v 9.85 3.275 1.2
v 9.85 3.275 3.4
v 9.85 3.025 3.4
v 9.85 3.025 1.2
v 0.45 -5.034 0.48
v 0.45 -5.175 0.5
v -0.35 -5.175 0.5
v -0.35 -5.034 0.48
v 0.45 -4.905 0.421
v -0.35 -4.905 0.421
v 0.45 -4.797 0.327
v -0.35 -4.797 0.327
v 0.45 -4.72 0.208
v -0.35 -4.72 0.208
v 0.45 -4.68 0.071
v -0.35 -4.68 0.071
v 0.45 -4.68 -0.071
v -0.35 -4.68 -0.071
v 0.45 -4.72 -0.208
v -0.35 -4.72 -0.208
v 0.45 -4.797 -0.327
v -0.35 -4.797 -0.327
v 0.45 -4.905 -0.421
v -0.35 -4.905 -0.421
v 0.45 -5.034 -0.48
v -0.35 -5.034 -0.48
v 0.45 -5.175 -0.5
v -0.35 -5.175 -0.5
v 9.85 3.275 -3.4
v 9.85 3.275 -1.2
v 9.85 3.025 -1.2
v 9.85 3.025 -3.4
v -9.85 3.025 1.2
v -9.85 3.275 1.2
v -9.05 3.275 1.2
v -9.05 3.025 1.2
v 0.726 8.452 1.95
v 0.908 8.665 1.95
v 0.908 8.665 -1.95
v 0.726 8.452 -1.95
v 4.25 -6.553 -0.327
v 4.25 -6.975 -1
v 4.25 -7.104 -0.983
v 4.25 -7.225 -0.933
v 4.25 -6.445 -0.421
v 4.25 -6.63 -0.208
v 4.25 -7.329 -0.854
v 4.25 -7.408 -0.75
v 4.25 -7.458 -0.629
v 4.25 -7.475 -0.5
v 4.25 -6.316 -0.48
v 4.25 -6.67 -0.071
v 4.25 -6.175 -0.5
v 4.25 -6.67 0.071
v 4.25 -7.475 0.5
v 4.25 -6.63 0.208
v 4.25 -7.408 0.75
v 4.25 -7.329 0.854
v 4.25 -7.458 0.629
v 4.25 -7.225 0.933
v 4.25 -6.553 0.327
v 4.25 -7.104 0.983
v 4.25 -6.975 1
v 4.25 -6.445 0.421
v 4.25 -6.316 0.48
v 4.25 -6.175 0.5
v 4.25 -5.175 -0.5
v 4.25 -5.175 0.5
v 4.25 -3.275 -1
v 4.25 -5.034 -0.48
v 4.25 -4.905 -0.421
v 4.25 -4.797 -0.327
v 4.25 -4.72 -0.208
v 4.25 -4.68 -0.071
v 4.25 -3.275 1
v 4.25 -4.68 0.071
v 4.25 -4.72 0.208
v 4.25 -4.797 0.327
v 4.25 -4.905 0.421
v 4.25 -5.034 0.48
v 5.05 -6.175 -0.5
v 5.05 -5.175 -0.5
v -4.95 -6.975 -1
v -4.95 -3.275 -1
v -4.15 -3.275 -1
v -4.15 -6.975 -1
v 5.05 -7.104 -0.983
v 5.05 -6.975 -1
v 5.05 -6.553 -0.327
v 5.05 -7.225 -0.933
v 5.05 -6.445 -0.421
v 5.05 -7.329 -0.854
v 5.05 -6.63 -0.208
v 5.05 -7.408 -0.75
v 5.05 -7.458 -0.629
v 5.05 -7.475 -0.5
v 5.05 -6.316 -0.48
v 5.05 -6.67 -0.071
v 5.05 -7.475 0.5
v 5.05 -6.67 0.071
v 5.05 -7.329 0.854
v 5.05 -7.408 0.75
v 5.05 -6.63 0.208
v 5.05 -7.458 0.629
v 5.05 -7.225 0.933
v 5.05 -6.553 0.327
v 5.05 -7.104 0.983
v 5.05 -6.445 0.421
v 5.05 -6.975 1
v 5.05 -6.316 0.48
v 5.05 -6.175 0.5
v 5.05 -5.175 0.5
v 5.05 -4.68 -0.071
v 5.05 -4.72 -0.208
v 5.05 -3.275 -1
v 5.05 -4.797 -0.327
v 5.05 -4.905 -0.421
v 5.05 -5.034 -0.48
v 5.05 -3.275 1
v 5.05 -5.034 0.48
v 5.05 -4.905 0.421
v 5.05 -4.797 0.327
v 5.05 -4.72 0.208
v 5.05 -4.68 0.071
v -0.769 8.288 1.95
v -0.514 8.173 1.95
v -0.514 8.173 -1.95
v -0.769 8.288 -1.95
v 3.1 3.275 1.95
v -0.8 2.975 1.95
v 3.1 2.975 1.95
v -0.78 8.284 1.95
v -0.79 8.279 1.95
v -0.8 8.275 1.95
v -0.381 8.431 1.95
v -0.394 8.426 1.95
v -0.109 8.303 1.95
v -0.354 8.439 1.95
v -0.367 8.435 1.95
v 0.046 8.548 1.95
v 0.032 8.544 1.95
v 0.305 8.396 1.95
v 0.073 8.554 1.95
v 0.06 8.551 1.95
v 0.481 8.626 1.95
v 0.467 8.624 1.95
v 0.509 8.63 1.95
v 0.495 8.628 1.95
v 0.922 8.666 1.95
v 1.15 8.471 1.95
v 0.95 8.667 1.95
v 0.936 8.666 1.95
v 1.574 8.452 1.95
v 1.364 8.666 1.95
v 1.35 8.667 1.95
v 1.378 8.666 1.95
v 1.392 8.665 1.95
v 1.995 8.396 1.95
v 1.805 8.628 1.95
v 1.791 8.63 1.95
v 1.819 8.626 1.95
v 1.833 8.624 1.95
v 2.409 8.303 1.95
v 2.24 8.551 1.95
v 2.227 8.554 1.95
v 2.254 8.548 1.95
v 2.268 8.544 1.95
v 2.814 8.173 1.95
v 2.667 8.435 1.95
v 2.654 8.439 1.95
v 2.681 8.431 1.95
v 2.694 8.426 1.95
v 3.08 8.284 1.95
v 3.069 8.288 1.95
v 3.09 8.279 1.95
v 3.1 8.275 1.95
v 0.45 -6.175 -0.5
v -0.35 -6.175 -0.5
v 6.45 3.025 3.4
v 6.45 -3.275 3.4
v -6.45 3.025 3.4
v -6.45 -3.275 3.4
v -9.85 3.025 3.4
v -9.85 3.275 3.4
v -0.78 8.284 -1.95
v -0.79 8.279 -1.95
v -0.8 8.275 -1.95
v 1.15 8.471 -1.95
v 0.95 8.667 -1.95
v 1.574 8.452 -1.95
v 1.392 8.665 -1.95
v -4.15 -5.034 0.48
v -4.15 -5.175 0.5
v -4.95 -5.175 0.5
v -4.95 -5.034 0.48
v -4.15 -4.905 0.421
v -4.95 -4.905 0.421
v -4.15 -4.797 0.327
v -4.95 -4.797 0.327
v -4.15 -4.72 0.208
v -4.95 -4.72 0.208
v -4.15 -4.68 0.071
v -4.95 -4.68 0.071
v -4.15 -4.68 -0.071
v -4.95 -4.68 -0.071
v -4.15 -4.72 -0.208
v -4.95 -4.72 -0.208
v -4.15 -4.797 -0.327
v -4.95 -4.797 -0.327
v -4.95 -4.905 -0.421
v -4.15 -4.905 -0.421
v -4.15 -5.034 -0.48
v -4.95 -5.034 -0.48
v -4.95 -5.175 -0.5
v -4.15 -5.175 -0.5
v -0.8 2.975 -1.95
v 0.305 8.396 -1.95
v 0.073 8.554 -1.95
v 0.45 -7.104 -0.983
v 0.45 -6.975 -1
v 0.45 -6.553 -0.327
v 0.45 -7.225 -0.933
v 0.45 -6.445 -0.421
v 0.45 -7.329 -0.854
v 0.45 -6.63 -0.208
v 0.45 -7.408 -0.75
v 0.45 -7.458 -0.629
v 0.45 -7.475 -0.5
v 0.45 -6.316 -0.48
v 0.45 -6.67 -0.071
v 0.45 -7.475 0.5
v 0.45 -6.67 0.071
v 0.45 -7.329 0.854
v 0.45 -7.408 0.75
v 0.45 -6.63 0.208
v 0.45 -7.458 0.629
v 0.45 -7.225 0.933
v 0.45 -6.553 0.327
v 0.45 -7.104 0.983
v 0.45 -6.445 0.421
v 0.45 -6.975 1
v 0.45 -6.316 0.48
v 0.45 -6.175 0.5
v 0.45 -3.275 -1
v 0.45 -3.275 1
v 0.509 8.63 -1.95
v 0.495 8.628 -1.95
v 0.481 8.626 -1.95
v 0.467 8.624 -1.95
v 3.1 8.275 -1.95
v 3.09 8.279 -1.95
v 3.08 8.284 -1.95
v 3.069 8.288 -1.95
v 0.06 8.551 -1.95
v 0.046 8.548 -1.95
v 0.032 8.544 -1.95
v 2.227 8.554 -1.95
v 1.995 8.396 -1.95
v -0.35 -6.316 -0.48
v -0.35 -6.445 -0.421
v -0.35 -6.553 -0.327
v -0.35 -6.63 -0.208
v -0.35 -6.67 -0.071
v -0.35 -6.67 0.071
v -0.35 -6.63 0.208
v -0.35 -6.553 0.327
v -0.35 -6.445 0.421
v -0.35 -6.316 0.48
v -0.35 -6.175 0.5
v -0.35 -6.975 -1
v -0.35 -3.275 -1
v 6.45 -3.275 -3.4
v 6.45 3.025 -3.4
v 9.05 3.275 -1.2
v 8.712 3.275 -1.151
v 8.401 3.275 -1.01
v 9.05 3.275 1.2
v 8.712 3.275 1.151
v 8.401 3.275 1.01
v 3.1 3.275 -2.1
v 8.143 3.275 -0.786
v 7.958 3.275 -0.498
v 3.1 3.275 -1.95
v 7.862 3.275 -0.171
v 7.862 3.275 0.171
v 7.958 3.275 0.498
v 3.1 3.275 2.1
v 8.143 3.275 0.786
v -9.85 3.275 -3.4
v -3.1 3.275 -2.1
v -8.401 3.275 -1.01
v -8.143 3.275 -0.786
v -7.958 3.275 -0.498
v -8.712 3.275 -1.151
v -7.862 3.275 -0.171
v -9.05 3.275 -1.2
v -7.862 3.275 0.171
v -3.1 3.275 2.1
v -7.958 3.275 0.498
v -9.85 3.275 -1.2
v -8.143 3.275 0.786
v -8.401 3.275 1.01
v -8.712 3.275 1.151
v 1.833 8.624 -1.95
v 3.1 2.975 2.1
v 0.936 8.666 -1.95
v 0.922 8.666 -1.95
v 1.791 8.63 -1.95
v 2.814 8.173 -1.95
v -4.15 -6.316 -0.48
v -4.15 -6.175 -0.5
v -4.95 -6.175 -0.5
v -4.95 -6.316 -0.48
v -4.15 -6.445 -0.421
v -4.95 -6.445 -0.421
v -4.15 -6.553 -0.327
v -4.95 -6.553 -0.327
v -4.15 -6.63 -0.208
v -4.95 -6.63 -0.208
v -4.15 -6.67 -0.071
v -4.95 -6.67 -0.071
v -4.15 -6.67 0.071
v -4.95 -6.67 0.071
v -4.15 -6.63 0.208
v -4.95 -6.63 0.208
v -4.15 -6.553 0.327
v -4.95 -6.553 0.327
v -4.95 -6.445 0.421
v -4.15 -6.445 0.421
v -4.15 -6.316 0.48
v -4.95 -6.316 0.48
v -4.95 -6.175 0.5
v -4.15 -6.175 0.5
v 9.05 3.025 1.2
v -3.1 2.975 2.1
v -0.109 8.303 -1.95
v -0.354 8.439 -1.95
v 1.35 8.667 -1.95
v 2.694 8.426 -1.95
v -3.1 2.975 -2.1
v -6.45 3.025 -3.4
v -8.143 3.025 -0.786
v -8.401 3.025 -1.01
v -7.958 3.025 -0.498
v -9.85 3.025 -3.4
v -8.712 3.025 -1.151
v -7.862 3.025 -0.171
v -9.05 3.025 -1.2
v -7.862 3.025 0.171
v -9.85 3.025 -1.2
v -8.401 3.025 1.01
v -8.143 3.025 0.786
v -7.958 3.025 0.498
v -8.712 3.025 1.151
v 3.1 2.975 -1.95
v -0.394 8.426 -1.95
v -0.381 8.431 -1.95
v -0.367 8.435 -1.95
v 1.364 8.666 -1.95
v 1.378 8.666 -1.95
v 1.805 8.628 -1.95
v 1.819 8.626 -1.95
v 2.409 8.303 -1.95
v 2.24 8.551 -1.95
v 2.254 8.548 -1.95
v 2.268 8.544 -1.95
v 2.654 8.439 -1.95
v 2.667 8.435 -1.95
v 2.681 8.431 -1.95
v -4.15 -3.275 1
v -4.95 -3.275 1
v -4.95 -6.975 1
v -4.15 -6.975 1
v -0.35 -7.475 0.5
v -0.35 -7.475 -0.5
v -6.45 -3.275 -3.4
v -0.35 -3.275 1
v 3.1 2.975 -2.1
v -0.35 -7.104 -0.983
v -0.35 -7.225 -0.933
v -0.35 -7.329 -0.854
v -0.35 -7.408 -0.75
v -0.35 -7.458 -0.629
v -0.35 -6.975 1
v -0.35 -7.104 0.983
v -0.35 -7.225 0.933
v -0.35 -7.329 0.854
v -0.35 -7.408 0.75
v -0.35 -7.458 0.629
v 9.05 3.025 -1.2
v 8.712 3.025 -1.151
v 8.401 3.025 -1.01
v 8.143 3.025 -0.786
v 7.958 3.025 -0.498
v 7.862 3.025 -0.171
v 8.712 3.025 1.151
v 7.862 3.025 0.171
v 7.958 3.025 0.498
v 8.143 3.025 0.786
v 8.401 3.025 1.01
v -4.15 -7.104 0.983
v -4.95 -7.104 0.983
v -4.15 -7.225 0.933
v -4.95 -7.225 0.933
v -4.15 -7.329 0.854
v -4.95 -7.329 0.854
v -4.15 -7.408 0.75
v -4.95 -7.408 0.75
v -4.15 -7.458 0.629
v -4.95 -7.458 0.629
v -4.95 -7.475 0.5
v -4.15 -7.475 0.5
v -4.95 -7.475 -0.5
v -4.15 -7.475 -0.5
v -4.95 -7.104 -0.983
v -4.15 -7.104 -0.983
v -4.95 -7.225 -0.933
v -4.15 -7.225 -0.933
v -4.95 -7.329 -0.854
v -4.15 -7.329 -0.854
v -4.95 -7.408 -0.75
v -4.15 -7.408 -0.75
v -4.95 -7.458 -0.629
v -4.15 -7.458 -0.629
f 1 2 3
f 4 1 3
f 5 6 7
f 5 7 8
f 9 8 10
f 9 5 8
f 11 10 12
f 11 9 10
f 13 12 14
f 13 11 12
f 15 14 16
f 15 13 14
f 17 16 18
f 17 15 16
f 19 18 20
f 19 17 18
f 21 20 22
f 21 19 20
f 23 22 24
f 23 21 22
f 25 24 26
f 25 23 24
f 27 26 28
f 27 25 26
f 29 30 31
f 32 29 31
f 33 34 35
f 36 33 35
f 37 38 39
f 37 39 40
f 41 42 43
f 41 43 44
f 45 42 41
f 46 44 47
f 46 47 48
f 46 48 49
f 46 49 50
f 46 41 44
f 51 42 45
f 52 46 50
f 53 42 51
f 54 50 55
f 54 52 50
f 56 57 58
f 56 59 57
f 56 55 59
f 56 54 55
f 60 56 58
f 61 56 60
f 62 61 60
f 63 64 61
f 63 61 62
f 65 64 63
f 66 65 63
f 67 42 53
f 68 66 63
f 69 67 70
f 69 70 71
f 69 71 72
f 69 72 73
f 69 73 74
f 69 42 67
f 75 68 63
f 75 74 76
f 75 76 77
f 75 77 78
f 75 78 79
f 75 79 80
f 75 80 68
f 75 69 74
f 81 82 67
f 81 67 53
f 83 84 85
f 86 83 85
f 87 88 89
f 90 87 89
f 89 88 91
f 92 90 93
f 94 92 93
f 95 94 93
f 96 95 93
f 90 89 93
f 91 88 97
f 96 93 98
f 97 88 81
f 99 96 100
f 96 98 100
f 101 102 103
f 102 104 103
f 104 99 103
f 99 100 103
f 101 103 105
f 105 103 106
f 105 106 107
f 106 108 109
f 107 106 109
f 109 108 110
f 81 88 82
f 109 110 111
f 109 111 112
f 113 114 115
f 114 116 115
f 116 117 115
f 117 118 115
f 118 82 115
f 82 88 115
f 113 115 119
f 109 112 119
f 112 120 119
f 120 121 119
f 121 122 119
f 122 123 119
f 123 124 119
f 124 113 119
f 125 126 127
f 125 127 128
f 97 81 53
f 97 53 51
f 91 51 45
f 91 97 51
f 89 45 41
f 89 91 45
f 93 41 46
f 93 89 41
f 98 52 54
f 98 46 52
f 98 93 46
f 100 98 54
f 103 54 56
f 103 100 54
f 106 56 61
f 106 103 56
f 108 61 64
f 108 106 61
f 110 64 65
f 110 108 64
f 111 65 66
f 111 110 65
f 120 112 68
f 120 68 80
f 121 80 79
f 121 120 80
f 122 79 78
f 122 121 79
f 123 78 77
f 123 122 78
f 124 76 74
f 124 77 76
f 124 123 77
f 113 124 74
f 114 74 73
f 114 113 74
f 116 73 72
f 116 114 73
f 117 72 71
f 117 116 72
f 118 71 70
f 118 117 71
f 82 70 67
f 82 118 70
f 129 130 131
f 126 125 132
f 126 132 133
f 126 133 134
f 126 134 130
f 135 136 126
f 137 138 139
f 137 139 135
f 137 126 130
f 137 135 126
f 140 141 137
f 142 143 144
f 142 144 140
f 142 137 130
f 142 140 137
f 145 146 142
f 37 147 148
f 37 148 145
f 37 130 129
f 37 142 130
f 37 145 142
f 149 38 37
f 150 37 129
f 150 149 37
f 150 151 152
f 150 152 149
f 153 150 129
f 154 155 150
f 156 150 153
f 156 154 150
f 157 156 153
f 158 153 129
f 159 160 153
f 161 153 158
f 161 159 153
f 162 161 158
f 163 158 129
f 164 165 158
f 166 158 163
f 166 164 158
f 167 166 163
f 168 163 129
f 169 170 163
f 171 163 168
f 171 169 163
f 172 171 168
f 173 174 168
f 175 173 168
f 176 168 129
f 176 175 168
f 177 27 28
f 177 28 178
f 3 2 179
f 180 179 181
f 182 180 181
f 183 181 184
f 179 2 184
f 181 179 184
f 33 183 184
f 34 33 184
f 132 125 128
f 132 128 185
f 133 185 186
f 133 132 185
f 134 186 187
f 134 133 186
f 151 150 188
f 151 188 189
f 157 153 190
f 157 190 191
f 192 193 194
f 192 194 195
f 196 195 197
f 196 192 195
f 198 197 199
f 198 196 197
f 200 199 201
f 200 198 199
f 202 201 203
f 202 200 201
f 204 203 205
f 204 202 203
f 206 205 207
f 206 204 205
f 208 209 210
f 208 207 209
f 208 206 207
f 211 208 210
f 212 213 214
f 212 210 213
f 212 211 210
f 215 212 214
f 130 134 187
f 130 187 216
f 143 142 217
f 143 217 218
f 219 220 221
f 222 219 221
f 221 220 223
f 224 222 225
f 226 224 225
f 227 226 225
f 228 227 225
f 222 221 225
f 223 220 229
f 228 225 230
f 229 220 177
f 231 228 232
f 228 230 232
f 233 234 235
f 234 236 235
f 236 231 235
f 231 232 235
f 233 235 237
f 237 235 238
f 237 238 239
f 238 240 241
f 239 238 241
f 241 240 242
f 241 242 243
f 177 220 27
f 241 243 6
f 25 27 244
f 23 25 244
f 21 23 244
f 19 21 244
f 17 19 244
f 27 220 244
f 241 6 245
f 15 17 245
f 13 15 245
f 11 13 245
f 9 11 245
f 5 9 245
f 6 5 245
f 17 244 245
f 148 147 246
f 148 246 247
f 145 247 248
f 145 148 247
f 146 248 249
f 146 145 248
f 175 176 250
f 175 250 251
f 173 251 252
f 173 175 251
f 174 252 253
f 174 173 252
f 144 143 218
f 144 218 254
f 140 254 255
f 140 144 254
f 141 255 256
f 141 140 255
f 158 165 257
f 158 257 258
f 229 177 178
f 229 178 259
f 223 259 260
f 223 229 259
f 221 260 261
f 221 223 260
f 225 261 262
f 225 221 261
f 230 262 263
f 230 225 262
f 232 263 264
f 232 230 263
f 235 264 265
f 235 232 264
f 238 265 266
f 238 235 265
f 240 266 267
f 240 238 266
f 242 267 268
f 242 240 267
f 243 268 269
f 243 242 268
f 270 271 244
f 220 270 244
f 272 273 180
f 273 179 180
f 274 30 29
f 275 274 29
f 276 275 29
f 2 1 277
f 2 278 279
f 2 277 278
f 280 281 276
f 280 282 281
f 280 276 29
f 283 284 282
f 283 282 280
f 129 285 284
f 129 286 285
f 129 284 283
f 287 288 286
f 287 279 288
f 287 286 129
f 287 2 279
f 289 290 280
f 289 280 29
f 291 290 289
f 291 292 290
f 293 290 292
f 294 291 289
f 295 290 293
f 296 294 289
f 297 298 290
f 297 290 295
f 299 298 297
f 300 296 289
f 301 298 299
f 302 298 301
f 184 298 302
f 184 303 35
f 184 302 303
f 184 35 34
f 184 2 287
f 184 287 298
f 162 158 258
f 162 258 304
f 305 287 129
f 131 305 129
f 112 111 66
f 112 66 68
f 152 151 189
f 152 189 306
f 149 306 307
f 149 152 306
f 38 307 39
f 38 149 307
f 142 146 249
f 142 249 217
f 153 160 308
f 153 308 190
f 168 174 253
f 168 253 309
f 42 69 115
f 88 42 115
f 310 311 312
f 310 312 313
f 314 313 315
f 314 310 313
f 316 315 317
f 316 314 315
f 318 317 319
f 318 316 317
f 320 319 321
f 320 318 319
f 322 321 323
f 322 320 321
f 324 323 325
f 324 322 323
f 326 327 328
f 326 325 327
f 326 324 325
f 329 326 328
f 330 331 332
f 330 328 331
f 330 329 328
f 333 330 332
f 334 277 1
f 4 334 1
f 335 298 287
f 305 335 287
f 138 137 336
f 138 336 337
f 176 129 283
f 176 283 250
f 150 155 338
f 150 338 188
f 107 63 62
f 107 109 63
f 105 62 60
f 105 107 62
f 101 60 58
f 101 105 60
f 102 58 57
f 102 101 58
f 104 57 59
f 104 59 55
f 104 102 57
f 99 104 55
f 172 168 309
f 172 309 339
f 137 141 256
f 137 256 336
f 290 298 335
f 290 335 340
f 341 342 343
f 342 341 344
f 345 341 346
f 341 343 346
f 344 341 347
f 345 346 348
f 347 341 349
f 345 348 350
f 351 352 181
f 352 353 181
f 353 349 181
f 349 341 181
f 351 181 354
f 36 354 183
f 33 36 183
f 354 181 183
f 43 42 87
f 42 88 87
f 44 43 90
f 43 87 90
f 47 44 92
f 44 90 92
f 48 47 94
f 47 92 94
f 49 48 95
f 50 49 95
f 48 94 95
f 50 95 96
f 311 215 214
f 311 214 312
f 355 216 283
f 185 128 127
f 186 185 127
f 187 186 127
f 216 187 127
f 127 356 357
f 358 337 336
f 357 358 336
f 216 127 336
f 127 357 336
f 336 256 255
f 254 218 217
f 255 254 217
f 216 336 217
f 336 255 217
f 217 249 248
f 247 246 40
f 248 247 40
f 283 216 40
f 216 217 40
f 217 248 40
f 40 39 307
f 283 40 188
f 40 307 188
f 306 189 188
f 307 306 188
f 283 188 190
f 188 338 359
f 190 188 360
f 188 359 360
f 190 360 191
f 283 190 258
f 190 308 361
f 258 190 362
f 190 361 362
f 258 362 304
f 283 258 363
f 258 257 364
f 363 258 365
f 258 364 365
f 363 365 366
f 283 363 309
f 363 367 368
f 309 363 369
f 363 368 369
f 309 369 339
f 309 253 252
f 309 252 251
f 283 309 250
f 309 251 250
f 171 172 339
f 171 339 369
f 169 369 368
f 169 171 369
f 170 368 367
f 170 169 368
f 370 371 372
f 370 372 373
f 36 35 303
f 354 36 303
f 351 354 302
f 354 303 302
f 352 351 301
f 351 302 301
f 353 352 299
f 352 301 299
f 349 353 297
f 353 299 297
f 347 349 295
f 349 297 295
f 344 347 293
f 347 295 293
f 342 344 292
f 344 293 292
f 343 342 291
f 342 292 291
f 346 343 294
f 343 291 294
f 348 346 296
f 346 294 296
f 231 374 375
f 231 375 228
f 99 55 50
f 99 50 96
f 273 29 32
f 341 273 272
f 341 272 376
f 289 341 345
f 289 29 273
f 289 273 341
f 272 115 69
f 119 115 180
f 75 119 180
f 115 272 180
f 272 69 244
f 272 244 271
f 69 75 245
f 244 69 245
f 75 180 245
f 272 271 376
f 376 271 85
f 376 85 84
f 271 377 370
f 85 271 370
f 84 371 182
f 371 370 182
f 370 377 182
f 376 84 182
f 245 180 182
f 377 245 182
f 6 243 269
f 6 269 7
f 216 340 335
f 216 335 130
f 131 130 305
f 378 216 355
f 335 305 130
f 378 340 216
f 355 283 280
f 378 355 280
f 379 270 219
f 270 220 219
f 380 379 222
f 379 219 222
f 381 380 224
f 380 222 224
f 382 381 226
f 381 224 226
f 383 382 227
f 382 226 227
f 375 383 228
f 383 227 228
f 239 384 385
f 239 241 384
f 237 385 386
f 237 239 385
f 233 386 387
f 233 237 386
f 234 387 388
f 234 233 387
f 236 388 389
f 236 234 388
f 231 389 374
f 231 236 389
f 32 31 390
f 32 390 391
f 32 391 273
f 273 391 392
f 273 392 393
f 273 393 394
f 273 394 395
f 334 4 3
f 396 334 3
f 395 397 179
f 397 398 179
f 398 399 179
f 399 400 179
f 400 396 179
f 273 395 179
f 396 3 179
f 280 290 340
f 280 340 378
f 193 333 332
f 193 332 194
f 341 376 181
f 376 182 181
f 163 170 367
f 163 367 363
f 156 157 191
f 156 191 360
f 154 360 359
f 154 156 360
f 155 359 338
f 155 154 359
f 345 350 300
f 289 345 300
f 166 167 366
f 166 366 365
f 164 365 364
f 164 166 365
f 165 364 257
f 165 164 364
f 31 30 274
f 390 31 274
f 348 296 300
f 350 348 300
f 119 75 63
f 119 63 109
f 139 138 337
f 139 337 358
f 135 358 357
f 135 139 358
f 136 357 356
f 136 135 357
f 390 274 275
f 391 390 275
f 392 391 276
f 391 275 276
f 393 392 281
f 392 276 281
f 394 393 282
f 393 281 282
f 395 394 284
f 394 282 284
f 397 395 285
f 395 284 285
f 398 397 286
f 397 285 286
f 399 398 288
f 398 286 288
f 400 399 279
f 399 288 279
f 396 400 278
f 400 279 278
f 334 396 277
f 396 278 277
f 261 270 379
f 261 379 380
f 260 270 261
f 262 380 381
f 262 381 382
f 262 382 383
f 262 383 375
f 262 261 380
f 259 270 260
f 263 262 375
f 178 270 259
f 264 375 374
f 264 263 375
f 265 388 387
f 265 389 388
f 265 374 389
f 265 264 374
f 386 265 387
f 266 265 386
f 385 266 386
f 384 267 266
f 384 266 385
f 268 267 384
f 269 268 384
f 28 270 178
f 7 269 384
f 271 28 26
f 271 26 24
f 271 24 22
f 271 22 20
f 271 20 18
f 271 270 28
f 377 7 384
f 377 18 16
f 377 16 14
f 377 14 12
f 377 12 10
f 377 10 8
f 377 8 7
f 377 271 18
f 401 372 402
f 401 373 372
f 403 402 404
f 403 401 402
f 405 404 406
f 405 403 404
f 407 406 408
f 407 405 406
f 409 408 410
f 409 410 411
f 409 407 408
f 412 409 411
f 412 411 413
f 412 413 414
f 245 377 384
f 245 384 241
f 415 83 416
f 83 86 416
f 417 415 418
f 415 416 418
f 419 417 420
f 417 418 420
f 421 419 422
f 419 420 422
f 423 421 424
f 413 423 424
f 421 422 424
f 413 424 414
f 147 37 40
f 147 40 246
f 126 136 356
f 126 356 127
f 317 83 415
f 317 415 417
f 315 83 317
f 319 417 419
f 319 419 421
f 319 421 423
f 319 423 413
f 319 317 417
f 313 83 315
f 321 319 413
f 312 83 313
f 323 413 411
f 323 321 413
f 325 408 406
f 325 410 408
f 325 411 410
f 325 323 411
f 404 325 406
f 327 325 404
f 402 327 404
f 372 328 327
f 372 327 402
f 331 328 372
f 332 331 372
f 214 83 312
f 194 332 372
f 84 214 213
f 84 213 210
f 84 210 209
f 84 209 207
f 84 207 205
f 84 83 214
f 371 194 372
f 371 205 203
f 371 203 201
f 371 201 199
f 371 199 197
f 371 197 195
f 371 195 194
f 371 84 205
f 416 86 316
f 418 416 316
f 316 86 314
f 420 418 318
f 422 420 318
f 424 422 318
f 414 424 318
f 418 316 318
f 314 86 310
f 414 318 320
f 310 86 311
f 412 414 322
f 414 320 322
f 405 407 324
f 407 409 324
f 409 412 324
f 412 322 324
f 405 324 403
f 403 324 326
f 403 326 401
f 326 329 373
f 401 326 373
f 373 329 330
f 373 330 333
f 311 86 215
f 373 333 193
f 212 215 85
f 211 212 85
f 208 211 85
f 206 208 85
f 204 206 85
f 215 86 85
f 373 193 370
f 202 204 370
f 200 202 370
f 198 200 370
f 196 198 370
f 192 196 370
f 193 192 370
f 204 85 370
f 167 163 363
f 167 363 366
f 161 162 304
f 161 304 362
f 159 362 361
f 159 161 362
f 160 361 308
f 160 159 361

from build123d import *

# Parameters (mm, degrees)
BOSS_EXTRU_1_DEPTH      = 3.4
BOSS_EXTRU_1_DEPTH_BACK = 3.4
ENL_V_MAT_EXTRU_1_DEPTH = 6.8
ESQUISSE4_W             = 6.2
ESQUISSE4_H             = 4.2
ENL_V_MAT_EXTRU_2_DEPTH = 0.3
BOSS_EXTRU_2_DEPTH      = 1.95
BOSS_EXTRU_2_DEPTH_BACK = 1.95
ESQUISSE7_W             = 0.8
ESQUISSE7_H             = 2
BOSS_EXTRU_3_DEPTH      = 4.2
CONG_1_R                = 0.5
ENL_V_MAT_EXTRU_3_DEPTH = 10.2


with BuildPart() as part:
    # Esquisse1 → Boss.-Extru.1 (new, two sides: drawn at the far end of the back side and taken through both)
    with BuildSketch(Plane.XY.offset(-BOSS_EXTRU_1_DEPTH_BACK)):
        Polygon((-6.45, 3.275), (6.45, 3.275), (9.85, 3.275), (9.85, 3.025), (6.45, 3.025), (6.45, -3.275), (-6.45, -3.275), (-6.45, 3.025), (-9.85, 3.025), (-9.85, 3.275), align=None)
    extrude(amount=BOSS_EXTRU_1_DEPTH + BOSS_EXTRU_1_DEPTH_BACK)

    # Esquisse3 → Enlèv. mat.-Extru.1 (cut)
    with BuildSketch(Plane(origin=(0, 3.275, 0), x_dir=(1, 0, 0), z_dir=(0, 1, 0))):
        with BuildLine():
            Line((-9.05, 1.2), (-9.85, 1.2))
            Line((-9.85, 1.2), (-9.85, -1.2))
            Line((-9.85, -1.2), (-9.05, -1.2))
            ThreePointArc((-9.05, -1.2), (-7.85, 0), (-9.05, 1.2))
        make_face()
        with BuildLine():
            Line((9.05, -1.2), (9.85, -1.2))
            Line((9.85, -1.2), (9.85, 1.2))
            Line((9.85, 1.2), (9.05, 1.2))
            ThreePointArc((9.05, 1.2), (7.85, 0), (9.05, -1.2))
        make_face()
    extrude(amount=-ENL_V_MAT_EXTRU_1_DEPTH, mode=Mode.SUBTRACT)

    # Esquisse4 → Enlèv. mat.-Extru.2 (cut)
    with BuildSketch(Plane(origin=(0, 3.275, 0), x_dir=(1, 0, 0), z_dir=(0, 1, 0))):
        Rectangle(ESQUISSE4_W, ESQUISSE4_H)
    extrude(amount=-ENL_V_MAT_EXTRU_2_DEPTH, mode=Mode.SUBTRACT)

    # Esquisse6 → Boss.-Extru.2 (add, two sides: drawn at the far end of the back side and taken through both)
    with BuildSketch(Plane.XY.offset(-BOSS_EXTRU_2_DEPTH_BACK)):
        with BuildLine():
            Line((-0.8, 2.975), (3.1, 2.975))
            Line((3.1, 2.975), (3.1, 8.275))
            ThreePointArc((3.1, 8.275), (3.084706872, 8.281447306), (3.069392428, 8.287843813))
            Line((3.069392428, 8.287843813), (2.813852393, 8.173324546))
            Line((2.813852393, 8.173324546), (2.694192526, 8.426498179))
            ThreePointArc((2.694192526, 8.426498179), (2.674028844, 8.432998384), (2.6538378, 8.439413095))
            Line((2.6538378, 8.439413095), (2.409418963, 8.302757307))
            Line((2.409418963, 8.302757307), (2.267851834, 8.544364675))
            ThreePointArc((2.267851834, 8.544364675), (2.247192567, 8.549057375), (2.226513602, 8.553662498))
            Line((2.226513602, 8.553662498), (1.995128872, 8.395939706))
            Line((1.995128872, 8.395939706), (1.832762436, 8.624089904))
            ThreePointArc((1.832762436, 8.624089904), (1.811769271, 8.626938372), (1.790764225, 8.629697865))
            Line((1.790764225, 8.629697865), (1.574224502, 8.452142463))
            Line((1.574224502, 8.452142463), (1.392329497, 8.665049906))
            ThreePointArc((1.392329497, 8.665049906), (1.371166734, 8.66603185), (1.35, 8.666924116))
            Line((1.35, 8.666924116), (1.15, 8.470925717))
            Line((1.15, 8.470925717), (0.95, 8.666924116))
            ThreePointArc((0.95, 8.666924116), (0.928833266, 8.66603185), (0.907670503, 8.665049906))
            Line((0.907670503, 8.665049906), (0.725775498, 8.452142463))
            Line((0.725775498, 8.452142463), (0.509235775, 8.629697865))
            ThreePointArc((0.509235775, 8.629697865), (0.488230729, 8.626938372), (0.467237564, 8.624089904))
            Line((0.467237564, 8.624089904), (0.304871128, 8.395939706))
            Line((0.304871128, 8.395939706), (0.073486398, 8.553662498))
            ThreePointArc((0.073486398, 8.553662498), (0.052807433, 8.549057375), (0.032148166, 8.544364675))
            Line((0.032148166, 8.544364675), (-0.109418963, 8.302757307))
            Line((-0.109418963, 8.302757307), (-0.3538378, 8.439413095))
            ThreePointArc((-0.3538378, 8.439413095), (-0.374028844, 8.432998384), (-0.394192526, 8.426498179))
            Line((-0.394192526, 8.426498179), (-0.513852393, 8.173324546))
            Line((-0.513852393, 8.173324546), (-0.769392428, 8.287843813))
            ThreePointArc((-0.769392428, 8.287843813), (-0.784706872, 8.281447306), (-0.8, 8.275))
            Line((-0.8, 8.275), (-0.8, 2.975))
        make_face()
    extrude(amount=BOSS_EXTRU_2_DEPTH + BOSS_EXTRU_2_DEPTH_BACK)

    # Esquisse7 → Boss.-Extru.3 (add)
    with BuildSketch(Plane.XZ.offset(3.275)):
        with Locations((-4.55, 0)):
            Rectangle(ESQUISSE7_W, ESQUISSE7_H)
        with Locations((0.05, 0)):
            Rectangle(ESQUISSE7_W, ESQUISSE7_H)
        with Locations((4.65, 0)):
            Rectangle(ESQUISSE7_W, ESQUISSE7_H)
    extrude(amount=BOSS_EXTRU_3_DEPTH)

    # Congé1
    cong_1_edges = [part.edges().sort_by_distance(p)[0] for p in [
        (-4.55, -7.475, -1),
        (0.05, -7.475, -1),
        (4.65, -7.475, -1),
        (0.05, -7.475, 1),
        (4.65, -7.475, 1),
        (-4.55, -7.475, 1),
    ]]
    fillet(cong_1_edges, radius=CONG_1_R)

    # Esquisse8 → Enlèv. mat.-Extru.3 (cut)
    with BuildSketch(Plane(origin=(5.05, 0, 0), x_dir=(0, 0, -1), z_dir=(1, 0, 0))):
        with BuildLine():
            Line((0.5, -5.175), (0.5, -6.175))
            ThreePointArc((0.5, -6.175), (0, -6.675), (-0.5, -6.175))
            Line((-0.5, -6.175), (-0.5, -5.175))
            ThreePointArc((-0.5, -5.175), (0, -4.675), (0.5, -5.175))
        make_face()
    extrude(amount=-ENL_V_MAT_EXTRU_3_DEPTH, mode=Mode.SUBTRACT)


solid = part.part
